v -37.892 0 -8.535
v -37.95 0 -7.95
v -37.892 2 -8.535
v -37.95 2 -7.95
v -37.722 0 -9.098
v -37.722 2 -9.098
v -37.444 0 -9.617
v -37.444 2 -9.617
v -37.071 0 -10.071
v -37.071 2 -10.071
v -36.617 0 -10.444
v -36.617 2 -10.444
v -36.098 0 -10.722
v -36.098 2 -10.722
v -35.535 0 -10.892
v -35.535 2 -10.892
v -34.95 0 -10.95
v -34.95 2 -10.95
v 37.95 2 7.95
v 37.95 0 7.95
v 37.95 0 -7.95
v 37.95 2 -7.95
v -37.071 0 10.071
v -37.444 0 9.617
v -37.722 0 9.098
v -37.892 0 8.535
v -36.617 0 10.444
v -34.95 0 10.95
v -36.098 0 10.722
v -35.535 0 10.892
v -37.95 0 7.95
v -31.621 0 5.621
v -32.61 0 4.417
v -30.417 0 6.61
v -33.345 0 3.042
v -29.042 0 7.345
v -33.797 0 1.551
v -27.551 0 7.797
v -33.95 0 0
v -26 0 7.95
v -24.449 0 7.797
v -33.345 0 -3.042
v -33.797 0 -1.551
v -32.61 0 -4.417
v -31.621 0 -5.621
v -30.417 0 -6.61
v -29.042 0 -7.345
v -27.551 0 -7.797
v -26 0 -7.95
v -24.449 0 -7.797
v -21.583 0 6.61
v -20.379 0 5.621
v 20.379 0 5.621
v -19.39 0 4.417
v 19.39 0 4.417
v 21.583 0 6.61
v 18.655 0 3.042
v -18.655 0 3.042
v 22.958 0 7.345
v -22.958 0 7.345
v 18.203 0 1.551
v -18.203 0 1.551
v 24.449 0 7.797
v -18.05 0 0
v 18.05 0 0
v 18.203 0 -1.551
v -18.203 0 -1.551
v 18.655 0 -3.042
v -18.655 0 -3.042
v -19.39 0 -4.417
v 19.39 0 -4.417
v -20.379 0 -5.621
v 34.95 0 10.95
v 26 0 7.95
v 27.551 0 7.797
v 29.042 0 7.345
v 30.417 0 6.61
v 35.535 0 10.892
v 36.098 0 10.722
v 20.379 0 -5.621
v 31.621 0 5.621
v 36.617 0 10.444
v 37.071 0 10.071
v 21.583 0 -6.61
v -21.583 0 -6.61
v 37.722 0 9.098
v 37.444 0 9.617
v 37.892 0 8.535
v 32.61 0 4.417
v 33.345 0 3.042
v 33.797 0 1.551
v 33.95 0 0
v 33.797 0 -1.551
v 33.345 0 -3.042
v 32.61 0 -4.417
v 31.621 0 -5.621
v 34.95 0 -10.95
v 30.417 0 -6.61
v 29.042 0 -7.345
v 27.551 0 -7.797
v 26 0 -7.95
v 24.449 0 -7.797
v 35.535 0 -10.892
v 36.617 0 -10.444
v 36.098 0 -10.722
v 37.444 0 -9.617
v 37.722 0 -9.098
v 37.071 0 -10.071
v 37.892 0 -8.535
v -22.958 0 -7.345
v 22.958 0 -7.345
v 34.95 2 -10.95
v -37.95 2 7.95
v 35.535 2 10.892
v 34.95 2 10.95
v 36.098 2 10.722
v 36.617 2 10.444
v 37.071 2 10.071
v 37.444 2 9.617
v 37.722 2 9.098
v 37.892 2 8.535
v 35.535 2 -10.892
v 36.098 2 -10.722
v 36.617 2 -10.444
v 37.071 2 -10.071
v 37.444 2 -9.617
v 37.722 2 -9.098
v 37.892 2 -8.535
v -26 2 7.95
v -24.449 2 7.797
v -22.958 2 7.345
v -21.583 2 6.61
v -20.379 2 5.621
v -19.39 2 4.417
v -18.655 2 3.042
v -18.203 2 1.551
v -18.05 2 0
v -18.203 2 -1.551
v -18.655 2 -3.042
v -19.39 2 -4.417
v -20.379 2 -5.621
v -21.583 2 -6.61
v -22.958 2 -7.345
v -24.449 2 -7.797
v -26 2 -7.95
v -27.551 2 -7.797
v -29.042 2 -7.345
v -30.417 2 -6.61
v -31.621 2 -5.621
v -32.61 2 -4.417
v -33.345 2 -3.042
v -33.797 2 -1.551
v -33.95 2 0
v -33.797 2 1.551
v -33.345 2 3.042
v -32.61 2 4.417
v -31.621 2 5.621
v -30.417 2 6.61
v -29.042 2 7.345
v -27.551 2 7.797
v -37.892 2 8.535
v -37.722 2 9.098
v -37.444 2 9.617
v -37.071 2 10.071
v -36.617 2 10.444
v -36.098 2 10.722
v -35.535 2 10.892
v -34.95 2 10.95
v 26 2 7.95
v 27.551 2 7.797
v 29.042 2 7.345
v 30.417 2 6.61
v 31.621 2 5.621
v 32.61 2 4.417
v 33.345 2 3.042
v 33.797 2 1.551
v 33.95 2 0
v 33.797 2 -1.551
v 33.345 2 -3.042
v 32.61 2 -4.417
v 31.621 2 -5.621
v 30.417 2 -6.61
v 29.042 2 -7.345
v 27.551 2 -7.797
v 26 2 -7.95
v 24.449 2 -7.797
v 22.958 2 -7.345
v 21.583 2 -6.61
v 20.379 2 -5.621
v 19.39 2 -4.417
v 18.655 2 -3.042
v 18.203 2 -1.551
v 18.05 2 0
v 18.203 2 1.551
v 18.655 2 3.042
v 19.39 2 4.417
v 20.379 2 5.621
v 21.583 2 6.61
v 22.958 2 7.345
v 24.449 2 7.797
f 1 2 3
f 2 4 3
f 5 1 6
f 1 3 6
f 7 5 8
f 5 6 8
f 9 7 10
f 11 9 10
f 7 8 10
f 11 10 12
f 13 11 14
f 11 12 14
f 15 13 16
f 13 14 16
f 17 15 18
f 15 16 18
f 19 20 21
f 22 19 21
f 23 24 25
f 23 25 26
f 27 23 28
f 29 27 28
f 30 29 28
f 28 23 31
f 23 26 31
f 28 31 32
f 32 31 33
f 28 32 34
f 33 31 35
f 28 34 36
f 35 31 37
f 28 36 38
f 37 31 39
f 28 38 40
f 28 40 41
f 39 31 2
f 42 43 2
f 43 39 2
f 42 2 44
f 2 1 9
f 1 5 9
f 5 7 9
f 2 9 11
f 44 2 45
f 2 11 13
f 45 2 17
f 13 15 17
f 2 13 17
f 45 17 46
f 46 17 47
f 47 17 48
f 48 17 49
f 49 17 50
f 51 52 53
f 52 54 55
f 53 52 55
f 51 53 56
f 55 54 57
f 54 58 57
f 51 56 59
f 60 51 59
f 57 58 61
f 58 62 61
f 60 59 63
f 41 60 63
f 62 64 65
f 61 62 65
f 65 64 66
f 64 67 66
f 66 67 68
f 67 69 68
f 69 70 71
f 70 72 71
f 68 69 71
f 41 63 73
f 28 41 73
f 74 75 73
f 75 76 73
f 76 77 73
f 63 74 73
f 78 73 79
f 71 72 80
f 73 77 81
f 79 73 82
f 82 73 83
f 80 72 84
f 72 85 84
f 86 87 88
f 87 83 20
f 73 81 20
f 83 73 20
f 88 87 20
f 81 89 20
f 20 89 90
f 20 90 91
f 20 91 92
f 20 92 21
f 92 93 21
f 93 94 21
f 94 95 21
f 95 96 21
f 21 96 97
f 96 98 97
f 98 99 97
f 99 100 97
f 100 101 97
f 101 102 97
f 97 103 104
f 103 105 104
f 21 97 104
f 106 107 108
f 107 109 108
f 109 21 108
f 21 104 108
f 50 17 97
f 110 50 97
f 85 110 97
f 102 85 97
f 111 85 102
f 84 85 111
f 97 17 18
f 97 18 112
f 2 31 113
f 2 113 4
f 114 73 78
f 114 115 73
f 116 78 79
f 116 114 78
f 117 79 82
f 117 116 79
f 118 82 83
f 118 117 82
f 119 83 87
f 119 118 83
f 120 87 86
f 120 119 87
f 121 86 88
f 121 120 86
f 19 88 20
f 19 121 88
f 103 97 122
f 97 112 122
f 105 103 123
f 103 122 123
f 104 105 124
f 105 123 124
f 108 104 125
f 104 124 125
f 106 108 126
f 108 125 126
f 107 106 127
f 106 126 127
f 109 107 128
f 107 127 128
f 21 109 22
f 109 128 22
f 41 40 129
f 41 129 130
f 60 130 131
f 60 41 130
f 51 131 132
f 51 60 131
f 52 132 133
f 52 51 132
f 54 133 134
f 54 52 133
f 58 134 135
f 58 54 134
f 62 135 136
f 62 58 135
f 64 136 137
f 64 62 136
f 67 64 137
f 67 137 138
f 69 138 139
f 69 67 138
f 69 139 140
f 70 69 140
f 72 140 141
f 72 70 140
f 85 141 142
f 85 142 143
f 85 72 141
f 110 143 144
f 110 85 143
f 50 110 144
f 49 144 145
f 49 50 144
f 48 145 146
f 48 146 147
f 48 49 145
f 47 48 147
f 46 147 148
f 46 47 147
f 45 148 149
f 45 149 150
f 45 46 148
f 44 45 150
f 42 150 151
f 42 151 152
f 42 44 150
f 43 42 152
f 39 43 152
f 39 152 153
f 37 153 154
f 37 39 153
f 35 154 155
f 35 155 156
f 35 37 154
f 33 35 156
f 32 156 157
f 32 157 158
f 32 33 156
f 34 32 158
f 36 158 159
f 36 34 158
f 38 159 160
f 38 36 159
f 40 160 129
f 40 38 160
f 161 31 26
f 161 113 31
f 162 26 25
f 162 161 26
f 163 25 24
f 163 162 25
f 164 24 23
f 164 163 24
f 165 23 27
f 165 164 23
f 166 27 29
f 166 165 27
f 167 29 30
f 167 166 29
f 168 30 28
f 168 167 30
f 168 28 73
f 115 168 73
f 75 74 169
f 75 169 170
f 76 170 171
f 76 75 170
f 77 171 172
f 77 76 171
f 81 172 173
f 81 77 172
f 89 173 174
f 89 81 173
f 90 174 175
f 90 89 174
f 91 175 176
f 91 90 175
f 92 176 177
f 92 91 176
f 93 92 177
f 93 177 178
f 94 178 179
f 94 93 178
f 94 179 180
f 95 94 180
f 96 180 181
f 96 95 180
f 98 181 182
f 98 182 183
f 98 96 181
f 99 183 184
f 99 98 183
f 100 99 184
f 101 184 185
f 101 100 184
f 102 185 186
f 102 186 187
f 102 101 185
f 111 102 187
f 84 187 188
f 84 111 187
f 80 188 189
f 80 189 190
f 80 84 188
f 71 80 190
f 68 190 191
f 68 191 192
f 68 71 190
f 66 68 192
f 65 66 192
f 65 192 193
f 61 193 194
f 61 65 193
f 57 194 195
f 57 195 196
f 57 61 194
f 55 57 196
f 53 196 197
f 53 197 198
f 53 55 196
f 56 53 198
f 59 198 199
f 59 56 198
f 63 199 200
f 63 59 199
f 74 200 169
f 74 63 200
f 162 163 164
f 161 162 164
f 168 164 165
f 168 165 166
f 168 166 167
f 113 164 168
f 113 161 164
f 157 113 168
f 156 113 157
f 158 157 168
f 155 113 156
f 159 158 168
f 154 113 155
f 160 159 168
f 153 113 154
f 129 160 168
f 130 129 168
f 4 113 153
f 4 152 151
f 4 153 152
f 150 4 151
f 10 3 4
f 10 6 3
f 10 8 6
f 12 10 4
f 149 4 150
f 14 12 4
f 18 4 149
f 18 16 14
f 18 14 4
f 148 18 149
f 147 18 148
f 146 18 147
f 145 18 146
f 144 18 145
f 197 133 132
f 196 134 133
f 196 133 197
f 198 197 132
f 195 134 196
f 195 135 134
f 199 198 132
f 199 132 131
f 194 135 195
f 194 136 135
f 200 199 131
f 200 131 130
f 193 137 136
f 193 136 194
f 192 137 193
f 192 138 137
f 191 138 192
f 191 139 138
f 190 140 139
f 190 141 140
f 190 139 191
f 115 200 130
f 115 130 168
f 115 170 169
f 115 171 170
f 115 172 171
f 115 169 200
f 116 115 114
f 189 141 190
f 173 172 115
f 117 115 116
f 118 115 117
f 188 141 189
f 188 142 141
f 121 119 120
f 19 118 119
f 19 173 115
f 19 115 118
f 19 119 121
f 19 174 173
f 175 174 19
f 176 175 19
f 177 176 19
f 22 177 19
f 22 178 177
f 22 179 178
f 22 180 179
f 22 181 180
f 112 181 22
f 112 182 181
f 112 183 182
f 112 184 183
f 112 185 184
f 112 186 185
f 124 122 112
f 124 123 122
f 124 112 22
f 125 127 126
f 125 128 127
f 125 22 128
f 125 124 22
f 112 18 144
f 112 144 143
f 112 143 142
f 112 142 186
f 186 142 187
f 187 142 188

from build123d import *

# Parameters (mm, degrees)
SKETCH1_W           = 75.9
SKETCH1_H           = 21.9
SKETCH1_R           = 7.95
BOSS_EXTRUDE1_DEPTH = 2
FILLET1_R           = 3


with BuildPart() as part:
    # Sketch1 → Boss-Extrude1 (new body)
    with BuildSketch(Plane(origin=(0, 0, 0), x_dir=(1, 0, 0), z_dir=(0, 1, 0))):
        Rectangle(SKETCH1_W, SKETCH1_H)
        with Locations(Location((26, 0, 0), (0, 0, 270))):
            Circle(SKETCH1_R, mode=Mode.SUBTRACT)
        with Locations(Location((-26, 0, 0), (0, 0, 270))):
            Circle(SKETCH1_R, mode=Mode.SUBTRACT)
    extrude(amount=BOSS_EXTRUDE1_DEPTH)

    # Fillet1
    fillet1_edges = [part.edges().sort_by_distance(p)[0] for p in [
        (37.95, 1, -10.95),
        (37.95, 1, 10.95),
        (-37.95, 1, 10.95),
        (-37.95, 1, -10.95),
    ]]
    fillet(fillet1_edges, radius=FILLET1_R)


solid = part.part
